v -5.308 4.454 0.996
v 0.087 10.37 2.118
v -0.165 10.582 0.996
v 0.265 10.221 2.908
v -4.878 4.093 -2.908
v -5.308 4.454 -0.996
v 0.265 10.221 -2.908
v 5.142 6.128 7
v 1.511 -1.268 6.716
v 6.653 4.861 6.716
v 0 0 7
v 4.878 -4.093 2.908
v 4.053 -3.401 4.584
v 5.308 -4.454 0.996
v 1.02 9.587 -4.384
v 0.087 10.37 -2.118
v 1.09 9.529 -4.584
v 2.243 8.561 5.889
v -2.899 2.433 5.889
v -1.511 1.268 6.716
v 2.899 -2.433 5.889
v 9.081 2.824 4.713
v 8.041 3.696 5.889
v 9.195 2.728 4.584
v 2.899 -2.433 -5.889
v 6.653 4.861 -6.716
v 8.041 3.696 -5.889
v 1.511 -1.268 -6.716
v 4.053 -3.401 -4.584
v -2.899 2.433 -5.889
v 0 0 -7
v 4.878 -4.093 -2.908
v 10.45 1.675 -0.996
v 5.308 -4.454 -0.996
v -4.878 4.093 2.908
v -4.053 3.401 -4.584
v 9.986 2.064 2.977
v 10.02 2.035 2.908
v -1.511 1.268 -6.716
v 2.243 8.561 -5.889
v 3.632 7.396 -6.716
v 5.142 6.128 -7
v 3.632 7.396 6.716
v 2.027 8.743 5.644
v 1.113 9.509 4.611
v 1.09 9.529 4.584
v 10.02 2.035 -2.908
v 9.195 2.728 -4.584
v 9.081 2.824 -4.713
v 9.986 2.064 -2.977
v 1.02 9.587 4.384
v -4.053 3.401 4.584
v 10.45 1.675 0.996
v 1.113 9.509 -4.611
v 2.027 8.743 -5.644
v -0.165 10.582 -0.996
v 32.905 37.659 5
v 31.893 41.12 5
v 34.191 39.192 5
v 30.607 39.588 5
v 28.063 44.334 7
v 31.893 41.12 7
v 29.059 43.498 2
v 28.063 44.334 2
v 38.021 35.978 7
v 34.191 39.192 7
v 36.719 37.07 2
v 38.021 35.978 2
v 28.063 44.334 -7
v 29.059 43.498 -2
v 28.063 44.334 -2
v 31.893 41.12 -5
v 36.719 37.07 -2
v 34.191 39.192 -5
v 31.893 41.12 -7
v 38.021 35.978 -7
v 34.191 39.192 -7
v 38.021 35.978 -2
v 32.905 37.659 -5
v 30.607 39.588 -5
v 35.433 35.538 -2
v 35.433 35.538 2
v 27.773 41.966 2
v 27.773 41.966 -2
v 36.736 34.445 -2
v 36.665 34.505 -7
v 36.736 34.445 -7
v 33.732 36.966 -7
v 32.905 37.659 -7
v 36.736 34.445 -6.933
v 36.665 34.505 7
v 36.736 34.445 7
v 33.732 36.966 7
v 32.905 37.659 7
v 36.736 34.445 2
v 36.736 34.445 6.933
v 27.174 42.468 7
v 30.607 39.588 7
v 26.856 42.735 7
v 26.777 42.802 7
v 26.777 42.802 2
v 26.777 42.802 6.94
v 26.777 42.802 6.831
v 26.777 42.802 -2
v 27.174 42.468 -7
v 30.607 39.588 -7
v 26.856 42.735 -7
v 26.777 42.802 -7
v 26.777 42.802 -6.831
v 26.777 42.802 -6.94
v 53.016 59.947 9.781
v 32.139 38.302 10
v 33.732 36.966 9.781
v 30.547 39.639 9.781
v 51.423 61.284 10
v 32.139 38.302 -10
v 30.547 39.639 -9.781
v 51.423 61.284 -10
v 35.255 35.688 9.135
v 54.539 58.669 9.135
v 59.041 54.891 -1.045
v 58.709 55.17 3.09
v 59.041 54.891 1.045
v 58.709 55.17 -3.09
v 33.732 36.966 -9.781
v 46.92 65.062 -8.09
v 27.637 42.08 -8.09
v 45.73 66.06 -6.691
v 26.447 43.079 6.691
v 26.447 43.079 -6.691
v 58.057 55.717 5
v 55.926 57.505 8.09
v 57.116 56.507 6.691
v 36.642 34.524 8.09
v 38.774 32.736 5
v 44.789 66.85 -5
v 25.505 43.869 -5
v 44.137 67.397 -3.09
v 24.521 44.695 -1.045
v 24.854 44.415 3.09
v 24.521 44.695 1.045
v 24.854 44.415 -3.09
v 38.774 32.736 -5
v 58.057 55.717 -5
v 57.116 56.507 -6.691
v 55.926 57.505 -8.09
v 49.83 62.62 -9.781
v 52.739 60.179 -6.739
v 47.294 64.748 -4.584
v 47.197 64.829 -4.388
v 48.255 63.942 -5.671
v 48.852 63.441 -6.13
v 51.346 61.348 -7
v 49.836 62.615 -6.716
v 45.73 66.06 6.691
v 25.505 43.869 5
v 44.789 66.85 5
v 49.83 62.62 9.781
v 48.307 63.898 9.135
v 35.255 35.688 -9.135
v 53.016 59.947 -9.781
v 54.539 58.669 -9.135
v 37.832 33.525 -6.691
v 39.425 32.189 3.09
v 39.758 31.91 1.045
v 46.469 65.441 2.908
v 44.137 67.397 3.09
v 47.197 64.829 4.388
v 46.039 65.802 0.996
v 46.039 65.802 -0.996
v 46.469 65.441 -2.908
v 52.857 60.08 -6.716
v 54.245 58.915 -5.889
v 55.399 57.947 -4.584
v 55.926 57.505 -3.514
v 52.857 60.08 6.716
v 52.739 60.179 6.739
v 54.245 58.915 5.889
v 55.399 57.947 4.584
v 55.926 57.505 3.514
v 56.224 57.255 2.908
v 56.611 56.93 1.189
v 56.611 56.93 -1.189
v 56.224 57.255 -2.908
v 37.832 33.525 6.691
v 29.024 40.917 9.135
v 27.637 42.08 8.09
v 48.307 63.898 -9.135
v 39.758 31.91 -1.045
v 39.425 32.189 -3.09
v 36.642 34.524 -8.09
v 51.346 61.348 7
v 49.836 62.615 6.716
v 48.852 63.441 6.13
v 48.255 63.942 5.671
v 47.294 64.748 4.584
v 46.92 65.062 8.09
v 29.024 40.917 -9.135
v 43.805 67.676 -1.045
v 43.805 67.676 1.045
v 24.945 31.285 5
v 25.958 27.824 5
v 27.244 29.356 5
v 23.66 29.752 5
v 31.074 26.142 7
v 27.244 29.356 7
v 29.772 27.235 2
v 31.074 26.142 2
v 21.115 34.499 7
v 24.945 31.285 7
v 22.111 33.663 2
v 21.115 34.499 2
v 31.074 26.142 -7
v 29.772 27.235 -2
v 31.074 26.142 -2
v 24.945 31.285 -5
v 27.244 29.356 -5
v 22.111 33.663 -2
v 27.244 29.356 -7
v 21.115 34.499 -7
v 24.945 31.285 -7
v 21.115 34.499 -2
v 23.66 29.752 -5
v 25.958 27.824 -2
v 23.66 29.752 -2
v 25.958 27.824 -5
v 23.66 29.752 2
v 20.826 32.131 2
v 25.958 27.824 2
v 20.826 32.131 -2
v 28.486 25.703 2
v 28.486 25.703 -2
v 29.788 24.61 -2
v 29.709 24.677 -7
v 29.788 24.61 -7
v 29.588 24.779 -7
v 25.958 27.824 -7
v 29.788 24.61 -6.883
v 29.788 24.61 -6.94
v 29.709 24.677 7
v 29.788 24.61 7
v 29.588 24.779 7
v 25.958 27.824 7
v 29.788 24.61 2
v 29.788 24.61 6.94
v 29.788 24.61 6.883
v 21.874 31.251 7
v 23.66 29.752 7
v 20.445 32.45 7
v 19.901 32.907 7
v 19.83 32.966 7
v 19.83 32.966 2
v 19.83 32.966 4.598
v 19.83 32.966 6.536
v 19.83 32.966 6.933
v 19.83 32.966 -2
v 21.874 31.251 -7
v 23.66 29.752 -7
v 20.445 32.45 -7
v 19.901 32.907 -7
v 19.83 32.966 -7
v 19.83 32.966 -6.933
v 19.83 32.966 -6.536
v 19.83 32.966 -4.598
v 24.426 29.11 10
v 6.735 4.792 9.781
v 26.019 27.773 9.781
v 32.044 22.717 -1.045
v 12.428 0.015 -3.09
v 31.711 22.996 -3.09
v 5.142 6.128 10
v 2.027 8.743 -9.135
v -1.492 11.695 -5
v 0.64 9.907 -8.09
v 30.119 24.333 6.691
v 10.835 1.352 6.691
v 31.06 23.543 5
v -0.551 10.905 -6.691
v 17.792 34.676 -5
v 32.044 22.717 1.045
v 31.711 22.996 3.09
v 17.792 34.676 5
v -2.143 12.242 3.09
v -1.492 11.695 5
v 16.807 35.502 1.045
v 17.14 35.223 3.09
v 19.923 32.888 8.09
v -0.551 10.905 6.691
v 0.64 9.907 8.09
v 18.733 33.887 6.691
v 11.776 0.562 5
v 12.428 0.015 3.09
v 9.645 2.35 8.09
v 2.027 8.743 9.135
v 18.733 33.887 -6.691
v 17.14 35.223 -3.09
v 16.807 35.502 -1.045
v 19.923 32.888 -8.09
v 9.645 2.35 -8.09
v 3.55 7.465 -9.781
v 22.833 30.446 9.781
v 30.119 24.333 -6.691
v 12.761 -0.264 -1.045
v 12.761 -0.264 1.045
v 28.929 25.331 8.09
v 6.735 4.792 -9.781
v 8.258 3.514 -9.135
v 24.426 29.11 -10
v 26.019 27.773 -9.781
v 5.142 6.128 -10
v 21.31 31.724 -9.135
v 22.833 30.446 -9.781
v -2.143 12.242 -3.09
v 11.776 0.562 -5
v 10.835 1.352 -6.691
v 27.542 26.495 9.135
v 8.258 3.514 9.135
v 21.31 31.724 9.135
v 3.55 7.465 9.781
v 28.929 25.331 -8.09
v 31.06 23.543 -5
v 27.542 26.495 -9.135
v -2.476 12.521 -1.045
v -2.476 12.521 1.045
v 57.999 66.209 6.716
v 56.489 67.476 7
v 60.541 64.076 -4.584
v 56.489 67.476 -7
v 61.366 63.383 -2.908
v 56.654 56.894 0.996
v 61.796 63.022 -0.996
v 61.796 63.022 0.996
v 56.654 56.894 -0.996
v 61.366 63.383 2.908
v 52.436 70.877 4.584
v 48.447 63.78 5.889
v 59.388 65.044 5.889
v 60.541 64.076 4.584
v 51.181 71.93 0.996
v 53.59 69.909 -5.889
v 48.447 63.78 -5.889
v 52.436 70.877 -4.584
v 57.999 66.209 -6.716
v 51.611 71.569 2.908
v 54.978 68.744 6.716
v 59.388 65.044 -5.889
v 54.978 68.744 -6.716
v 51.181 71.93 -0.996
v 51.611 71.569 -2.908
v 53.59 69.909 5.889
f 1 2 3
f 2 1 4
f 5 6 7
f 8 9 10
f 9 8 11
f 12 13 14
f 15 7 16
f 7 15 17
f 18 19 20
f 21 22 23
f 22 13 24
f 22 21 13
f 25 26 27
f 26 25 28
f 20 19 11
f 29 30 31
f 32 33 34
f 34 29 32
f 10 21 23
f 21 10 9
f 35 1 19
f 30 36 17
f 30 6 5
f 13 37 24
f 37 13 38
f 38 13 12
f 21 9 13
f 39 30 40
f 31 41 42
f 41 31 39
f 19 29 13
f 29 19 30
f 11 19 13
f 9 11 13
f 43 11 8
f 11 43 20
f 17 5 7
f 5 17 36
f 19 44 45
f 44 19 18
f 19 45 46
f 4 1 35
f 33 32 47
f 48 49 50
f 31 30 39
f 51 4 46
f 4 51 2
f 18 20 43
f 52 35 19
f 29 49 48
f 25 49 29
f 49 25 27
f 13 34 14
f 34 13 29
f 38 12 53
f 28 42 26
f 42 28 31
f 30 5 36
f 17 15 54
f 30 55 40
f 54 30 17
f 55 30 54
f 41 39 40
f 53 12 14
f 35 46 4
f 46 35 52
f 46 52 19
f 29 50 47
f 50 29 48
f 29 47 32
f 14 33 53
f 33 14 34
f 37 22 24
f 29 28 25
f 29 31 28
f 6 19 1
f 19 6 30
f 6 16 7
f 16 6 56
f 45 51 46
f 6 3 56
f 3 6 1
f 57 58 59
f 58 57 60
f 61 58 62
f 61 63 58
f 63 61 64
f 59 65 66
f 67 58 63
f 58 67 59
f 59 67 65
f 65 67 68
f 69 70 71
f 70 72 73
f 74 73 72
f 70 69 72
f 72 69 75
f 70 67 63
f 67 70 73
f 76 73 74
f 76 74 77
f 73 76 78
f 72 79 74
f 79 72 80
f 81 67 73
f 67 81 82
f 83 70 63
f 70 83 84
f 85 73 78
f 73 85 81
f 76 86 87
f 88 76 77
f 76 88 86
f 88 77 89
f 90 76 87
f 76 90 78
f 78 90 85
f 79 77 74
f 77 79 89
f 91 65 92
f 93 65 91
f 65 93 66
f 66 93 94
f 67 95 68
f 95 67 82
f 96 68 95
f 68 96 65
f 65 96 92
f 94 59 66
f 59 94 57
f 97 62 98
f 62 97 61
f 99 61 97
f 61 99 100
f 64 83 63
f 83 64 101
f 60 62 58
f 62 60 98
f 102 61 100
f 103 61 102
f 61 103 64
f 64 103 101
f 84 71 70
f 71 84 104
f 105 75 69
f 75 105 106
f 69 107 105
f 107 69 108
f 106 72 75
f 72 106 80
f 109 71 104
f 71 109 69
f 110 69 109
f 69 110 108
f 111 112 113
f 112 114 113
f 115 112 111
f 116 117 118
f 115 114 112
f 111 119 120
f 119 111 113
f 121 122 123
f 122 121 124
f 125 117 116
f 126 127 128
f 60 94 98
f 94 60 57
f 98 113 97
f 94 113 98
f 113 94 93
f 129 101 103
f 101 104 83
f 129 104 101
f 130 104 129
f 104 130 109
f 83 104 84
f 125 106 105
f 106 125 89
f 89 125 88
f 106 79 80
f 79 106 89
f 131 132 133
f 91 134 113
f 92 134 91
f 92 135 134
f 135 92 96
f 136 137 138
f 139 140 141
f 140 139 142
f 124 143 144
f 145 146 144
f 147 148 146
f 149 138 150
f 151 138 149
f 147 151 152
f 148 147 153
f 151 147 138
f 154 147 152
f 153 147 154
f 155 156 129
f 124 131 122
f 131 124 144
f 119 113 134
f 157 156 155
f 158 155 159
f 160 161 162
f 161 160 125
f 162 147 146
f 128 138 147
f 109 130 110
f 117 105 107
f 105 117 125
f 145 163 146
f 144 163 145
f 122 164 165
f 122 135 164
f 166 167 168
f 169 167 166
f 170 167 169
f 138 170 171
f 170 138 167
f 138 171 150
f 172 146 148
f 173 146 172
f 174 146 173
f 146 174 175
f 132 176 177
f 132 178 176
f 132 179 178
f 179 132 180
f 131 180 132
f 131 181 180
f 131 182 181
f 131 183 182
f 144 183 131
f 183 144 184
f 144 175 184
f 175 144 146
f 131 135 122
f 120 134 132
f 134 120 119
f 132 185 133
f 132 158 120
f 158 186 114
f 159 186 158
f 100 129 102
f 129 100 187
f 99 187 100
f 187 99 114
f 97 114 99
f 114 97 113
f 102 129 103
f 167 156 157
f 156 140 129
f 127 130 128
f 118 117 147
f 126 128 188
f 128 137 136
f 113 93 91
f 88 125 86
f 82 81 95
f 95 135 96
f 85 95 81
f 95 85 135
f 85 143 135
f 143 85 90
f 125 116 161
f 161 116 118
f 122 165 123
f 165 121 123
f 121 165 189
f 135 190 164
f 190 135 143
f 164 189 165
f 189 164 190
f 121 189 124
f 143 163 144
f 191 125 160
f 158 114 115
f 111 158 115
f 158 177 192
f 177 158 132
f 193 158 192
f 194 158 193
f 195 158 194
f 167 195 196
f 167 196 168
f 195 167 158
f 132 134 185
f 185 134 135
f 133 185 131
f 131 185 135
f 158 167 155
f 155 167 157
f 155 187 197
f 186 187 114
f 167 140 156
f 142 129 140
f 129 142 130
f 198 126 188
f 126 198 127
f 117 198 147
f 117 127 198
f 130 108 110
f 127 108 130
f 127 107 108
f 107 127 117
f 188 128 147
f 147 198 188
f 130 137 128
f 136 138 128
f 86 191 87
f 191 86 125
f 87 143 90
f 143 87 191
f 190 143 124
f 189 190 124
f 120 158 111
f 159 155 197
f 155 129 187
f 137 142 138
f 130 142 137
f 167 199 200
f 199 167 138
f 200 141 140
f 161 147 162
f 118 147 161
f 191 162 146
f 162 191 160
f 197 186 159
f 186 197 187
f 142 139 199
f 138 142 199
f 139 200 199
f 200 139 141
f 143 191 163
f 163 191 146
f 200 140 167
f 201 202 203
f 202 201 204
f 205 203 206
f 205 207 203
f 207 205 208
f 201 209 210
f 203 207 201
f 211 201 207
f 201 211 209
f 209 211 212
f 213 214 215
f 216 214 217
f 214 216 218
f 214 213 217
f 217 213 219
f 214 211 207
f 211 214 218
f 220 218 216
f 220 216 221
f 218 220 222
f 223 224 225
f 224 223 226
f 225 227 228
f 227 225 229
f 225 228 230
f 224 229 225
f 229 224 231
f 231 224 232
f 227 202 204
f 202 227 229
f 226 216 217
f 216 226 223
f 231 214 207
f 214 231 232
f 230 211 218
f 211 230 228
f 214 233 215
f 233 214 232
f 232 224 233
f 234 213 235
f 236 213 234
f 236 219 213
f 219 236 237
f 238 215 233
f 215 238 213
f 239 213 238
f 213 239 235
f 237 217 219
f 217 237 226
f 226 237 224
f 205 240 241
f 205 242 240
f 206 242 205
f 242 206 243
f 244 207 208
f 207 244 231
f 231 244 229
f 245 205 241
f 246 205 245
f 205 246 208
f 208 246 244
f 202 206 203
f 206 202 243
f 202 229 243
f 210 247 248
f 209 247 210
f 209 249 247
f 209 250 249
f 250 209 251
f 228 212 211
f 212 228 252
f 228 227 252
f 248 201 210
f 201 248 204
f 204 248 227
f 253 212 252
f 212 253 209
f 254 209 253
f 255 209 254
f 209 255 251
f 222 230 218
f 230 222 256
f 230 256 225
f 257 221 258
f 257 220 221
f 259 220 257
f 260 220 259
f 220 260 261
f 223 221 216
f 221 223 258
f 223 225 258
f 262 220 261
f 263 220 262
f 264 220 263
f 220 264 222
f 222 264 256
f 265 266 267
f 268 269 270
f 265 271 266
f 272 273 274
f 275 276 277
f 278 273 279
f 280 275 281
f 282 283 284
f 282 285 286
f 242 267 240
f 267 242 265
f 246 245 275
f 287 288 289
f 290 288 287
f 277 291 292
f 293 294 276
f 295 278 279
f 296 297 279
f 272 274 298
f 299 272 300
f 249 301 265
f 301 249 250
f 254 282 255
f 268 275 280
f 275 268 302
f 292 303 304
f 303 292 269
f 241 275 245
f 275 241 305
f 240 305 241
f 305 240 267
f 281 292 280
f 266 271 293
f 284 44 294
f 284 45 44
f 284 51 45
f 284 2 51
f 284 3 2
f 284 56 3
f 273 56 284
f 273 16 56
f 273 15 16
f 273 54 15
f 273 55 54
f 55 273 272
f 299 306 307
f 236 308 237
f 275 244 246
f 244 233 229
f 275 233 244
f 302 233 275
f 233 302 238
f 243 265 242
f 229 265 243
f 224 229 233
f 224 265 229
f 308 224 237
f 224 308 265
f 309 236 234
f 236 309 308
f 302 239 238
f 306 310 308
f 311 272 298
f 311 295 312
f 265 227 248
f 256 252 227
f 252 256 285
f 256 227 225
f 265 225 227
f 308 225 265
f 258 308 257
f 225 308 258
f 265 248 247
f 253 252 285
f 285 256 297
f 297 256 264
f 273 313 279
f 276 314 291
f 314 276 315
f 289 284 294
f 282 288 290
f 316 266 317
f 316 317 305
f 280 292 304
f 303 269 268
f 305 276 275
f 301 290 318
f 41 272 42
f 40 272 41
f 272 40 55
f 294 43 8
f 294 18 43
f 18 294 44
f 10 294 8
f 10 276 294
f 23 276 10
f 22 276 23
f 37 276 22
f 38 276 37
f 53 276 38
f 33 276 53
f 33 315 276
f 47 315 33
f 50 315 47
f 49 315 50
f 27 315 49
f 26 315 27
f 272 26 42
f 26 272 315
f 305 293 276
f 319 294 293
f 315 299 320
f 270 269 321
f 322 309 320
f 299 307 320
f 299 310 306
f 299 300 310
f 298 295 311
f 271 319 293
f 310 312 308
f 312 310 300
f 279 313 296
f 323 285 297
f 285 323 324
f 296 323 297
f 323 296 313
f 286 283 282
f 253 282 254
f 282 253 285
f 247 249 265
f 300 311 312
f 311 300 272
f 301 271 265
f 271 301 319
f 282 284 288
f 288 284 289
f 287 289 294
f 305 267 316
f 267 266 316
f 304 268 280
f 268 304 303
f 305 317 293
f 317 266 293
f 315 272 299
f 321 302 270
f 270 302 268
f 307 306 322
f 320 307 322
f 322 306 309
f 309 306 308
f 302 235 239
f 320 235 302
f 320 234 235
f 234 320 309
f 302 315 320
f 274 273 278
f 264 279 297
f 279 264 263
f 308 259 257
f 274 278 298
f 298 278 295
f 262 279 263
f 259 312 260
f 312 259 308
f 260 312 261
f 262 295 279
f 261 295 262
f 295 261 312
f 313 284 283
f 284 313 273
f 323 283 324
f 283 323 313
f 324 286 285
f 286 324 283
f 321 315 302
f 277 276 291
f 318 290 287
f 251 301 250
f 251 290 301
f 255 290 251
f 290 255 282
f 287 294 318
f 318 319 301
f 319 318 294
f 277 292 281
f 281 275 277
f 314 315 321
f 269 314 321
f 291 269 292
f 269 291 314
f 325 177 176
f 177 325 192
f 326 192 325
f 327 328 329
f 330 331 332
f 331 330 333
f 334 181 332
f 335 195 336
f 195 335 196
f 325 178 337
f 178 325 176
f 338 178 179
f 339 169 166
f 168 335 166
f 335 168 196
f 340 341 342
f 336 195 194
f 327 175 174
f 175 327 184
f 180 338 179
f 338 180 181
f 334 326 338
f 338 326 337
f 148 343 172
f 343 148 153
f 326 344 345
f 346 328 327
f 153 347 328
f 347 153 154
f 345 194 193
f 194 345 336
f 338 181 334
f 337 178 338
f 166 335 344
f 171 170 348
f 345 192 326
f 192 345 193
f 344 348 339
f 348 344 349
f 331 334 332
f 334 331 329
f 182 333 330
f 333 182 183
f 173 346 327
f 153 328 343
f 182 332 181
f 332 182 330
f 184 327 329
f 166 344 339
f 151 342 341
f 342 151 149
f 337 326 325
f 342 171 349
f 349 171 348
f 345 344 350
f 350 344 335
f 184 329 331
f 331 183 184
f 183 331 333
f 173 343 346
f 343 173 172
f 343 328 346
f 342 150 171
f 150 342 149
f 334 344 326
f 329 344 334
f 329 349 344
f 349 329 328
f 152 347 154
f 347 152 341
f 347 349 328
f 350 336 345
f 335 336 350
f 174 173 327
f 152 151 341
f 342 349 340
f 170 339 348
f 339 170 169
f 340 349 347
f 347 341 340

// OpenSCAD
w = 3;
d = 30;
h = 1;

difference(){
rotate([0,-90,-130])
    color("white")
    cylinder(8,7,7);

translate([+2,+3,+2])
    color("white")
    cylinder(2,2,2);
}

rotate([0,-90,-130])
translate([0,0,+8])
    color("yellow")
    cylinder(30,10,10);

rotate([0,-90,-130])
    color("white")
    cylinder(8,7,4);

difference(){
rotate([0,-90,-130])
translate([0,-0,+50])
    color("yellow")
    cylinder(30,10,10);

rotate([0,-90,-130])color("white"){
translate([-5,-26,+50]){
translate([0,20.3,-2])cube([10,10,4]);
translate([-2,27,-1])cube([5,5,3]);

translate([+7,27,-1])cube([5,5,3]);
translate([+7,19,-1])cube([5,5,3]);
translate([-2,19,-1])cube([5,5,3]);
}
}
}

rotate([0,-90,-130])
translate([0,-0.1,+80])
    color("white")
    cylinder(8,7,7);

difference(){
difference(){
rotate([0,-90,-130])color("white"){
translate([-5,-25,36]){
translate([0,20.3,2])cube([10,10,2]);
translate([-2,27,-1])cube(5,5,5);

translate([+7,27,-1])cube([5,5,5]);
translate([+7,19,-1])cube([5,5,5]);
translate([-2,19,-1])cube([5,5,5]);
}
}
}
}
